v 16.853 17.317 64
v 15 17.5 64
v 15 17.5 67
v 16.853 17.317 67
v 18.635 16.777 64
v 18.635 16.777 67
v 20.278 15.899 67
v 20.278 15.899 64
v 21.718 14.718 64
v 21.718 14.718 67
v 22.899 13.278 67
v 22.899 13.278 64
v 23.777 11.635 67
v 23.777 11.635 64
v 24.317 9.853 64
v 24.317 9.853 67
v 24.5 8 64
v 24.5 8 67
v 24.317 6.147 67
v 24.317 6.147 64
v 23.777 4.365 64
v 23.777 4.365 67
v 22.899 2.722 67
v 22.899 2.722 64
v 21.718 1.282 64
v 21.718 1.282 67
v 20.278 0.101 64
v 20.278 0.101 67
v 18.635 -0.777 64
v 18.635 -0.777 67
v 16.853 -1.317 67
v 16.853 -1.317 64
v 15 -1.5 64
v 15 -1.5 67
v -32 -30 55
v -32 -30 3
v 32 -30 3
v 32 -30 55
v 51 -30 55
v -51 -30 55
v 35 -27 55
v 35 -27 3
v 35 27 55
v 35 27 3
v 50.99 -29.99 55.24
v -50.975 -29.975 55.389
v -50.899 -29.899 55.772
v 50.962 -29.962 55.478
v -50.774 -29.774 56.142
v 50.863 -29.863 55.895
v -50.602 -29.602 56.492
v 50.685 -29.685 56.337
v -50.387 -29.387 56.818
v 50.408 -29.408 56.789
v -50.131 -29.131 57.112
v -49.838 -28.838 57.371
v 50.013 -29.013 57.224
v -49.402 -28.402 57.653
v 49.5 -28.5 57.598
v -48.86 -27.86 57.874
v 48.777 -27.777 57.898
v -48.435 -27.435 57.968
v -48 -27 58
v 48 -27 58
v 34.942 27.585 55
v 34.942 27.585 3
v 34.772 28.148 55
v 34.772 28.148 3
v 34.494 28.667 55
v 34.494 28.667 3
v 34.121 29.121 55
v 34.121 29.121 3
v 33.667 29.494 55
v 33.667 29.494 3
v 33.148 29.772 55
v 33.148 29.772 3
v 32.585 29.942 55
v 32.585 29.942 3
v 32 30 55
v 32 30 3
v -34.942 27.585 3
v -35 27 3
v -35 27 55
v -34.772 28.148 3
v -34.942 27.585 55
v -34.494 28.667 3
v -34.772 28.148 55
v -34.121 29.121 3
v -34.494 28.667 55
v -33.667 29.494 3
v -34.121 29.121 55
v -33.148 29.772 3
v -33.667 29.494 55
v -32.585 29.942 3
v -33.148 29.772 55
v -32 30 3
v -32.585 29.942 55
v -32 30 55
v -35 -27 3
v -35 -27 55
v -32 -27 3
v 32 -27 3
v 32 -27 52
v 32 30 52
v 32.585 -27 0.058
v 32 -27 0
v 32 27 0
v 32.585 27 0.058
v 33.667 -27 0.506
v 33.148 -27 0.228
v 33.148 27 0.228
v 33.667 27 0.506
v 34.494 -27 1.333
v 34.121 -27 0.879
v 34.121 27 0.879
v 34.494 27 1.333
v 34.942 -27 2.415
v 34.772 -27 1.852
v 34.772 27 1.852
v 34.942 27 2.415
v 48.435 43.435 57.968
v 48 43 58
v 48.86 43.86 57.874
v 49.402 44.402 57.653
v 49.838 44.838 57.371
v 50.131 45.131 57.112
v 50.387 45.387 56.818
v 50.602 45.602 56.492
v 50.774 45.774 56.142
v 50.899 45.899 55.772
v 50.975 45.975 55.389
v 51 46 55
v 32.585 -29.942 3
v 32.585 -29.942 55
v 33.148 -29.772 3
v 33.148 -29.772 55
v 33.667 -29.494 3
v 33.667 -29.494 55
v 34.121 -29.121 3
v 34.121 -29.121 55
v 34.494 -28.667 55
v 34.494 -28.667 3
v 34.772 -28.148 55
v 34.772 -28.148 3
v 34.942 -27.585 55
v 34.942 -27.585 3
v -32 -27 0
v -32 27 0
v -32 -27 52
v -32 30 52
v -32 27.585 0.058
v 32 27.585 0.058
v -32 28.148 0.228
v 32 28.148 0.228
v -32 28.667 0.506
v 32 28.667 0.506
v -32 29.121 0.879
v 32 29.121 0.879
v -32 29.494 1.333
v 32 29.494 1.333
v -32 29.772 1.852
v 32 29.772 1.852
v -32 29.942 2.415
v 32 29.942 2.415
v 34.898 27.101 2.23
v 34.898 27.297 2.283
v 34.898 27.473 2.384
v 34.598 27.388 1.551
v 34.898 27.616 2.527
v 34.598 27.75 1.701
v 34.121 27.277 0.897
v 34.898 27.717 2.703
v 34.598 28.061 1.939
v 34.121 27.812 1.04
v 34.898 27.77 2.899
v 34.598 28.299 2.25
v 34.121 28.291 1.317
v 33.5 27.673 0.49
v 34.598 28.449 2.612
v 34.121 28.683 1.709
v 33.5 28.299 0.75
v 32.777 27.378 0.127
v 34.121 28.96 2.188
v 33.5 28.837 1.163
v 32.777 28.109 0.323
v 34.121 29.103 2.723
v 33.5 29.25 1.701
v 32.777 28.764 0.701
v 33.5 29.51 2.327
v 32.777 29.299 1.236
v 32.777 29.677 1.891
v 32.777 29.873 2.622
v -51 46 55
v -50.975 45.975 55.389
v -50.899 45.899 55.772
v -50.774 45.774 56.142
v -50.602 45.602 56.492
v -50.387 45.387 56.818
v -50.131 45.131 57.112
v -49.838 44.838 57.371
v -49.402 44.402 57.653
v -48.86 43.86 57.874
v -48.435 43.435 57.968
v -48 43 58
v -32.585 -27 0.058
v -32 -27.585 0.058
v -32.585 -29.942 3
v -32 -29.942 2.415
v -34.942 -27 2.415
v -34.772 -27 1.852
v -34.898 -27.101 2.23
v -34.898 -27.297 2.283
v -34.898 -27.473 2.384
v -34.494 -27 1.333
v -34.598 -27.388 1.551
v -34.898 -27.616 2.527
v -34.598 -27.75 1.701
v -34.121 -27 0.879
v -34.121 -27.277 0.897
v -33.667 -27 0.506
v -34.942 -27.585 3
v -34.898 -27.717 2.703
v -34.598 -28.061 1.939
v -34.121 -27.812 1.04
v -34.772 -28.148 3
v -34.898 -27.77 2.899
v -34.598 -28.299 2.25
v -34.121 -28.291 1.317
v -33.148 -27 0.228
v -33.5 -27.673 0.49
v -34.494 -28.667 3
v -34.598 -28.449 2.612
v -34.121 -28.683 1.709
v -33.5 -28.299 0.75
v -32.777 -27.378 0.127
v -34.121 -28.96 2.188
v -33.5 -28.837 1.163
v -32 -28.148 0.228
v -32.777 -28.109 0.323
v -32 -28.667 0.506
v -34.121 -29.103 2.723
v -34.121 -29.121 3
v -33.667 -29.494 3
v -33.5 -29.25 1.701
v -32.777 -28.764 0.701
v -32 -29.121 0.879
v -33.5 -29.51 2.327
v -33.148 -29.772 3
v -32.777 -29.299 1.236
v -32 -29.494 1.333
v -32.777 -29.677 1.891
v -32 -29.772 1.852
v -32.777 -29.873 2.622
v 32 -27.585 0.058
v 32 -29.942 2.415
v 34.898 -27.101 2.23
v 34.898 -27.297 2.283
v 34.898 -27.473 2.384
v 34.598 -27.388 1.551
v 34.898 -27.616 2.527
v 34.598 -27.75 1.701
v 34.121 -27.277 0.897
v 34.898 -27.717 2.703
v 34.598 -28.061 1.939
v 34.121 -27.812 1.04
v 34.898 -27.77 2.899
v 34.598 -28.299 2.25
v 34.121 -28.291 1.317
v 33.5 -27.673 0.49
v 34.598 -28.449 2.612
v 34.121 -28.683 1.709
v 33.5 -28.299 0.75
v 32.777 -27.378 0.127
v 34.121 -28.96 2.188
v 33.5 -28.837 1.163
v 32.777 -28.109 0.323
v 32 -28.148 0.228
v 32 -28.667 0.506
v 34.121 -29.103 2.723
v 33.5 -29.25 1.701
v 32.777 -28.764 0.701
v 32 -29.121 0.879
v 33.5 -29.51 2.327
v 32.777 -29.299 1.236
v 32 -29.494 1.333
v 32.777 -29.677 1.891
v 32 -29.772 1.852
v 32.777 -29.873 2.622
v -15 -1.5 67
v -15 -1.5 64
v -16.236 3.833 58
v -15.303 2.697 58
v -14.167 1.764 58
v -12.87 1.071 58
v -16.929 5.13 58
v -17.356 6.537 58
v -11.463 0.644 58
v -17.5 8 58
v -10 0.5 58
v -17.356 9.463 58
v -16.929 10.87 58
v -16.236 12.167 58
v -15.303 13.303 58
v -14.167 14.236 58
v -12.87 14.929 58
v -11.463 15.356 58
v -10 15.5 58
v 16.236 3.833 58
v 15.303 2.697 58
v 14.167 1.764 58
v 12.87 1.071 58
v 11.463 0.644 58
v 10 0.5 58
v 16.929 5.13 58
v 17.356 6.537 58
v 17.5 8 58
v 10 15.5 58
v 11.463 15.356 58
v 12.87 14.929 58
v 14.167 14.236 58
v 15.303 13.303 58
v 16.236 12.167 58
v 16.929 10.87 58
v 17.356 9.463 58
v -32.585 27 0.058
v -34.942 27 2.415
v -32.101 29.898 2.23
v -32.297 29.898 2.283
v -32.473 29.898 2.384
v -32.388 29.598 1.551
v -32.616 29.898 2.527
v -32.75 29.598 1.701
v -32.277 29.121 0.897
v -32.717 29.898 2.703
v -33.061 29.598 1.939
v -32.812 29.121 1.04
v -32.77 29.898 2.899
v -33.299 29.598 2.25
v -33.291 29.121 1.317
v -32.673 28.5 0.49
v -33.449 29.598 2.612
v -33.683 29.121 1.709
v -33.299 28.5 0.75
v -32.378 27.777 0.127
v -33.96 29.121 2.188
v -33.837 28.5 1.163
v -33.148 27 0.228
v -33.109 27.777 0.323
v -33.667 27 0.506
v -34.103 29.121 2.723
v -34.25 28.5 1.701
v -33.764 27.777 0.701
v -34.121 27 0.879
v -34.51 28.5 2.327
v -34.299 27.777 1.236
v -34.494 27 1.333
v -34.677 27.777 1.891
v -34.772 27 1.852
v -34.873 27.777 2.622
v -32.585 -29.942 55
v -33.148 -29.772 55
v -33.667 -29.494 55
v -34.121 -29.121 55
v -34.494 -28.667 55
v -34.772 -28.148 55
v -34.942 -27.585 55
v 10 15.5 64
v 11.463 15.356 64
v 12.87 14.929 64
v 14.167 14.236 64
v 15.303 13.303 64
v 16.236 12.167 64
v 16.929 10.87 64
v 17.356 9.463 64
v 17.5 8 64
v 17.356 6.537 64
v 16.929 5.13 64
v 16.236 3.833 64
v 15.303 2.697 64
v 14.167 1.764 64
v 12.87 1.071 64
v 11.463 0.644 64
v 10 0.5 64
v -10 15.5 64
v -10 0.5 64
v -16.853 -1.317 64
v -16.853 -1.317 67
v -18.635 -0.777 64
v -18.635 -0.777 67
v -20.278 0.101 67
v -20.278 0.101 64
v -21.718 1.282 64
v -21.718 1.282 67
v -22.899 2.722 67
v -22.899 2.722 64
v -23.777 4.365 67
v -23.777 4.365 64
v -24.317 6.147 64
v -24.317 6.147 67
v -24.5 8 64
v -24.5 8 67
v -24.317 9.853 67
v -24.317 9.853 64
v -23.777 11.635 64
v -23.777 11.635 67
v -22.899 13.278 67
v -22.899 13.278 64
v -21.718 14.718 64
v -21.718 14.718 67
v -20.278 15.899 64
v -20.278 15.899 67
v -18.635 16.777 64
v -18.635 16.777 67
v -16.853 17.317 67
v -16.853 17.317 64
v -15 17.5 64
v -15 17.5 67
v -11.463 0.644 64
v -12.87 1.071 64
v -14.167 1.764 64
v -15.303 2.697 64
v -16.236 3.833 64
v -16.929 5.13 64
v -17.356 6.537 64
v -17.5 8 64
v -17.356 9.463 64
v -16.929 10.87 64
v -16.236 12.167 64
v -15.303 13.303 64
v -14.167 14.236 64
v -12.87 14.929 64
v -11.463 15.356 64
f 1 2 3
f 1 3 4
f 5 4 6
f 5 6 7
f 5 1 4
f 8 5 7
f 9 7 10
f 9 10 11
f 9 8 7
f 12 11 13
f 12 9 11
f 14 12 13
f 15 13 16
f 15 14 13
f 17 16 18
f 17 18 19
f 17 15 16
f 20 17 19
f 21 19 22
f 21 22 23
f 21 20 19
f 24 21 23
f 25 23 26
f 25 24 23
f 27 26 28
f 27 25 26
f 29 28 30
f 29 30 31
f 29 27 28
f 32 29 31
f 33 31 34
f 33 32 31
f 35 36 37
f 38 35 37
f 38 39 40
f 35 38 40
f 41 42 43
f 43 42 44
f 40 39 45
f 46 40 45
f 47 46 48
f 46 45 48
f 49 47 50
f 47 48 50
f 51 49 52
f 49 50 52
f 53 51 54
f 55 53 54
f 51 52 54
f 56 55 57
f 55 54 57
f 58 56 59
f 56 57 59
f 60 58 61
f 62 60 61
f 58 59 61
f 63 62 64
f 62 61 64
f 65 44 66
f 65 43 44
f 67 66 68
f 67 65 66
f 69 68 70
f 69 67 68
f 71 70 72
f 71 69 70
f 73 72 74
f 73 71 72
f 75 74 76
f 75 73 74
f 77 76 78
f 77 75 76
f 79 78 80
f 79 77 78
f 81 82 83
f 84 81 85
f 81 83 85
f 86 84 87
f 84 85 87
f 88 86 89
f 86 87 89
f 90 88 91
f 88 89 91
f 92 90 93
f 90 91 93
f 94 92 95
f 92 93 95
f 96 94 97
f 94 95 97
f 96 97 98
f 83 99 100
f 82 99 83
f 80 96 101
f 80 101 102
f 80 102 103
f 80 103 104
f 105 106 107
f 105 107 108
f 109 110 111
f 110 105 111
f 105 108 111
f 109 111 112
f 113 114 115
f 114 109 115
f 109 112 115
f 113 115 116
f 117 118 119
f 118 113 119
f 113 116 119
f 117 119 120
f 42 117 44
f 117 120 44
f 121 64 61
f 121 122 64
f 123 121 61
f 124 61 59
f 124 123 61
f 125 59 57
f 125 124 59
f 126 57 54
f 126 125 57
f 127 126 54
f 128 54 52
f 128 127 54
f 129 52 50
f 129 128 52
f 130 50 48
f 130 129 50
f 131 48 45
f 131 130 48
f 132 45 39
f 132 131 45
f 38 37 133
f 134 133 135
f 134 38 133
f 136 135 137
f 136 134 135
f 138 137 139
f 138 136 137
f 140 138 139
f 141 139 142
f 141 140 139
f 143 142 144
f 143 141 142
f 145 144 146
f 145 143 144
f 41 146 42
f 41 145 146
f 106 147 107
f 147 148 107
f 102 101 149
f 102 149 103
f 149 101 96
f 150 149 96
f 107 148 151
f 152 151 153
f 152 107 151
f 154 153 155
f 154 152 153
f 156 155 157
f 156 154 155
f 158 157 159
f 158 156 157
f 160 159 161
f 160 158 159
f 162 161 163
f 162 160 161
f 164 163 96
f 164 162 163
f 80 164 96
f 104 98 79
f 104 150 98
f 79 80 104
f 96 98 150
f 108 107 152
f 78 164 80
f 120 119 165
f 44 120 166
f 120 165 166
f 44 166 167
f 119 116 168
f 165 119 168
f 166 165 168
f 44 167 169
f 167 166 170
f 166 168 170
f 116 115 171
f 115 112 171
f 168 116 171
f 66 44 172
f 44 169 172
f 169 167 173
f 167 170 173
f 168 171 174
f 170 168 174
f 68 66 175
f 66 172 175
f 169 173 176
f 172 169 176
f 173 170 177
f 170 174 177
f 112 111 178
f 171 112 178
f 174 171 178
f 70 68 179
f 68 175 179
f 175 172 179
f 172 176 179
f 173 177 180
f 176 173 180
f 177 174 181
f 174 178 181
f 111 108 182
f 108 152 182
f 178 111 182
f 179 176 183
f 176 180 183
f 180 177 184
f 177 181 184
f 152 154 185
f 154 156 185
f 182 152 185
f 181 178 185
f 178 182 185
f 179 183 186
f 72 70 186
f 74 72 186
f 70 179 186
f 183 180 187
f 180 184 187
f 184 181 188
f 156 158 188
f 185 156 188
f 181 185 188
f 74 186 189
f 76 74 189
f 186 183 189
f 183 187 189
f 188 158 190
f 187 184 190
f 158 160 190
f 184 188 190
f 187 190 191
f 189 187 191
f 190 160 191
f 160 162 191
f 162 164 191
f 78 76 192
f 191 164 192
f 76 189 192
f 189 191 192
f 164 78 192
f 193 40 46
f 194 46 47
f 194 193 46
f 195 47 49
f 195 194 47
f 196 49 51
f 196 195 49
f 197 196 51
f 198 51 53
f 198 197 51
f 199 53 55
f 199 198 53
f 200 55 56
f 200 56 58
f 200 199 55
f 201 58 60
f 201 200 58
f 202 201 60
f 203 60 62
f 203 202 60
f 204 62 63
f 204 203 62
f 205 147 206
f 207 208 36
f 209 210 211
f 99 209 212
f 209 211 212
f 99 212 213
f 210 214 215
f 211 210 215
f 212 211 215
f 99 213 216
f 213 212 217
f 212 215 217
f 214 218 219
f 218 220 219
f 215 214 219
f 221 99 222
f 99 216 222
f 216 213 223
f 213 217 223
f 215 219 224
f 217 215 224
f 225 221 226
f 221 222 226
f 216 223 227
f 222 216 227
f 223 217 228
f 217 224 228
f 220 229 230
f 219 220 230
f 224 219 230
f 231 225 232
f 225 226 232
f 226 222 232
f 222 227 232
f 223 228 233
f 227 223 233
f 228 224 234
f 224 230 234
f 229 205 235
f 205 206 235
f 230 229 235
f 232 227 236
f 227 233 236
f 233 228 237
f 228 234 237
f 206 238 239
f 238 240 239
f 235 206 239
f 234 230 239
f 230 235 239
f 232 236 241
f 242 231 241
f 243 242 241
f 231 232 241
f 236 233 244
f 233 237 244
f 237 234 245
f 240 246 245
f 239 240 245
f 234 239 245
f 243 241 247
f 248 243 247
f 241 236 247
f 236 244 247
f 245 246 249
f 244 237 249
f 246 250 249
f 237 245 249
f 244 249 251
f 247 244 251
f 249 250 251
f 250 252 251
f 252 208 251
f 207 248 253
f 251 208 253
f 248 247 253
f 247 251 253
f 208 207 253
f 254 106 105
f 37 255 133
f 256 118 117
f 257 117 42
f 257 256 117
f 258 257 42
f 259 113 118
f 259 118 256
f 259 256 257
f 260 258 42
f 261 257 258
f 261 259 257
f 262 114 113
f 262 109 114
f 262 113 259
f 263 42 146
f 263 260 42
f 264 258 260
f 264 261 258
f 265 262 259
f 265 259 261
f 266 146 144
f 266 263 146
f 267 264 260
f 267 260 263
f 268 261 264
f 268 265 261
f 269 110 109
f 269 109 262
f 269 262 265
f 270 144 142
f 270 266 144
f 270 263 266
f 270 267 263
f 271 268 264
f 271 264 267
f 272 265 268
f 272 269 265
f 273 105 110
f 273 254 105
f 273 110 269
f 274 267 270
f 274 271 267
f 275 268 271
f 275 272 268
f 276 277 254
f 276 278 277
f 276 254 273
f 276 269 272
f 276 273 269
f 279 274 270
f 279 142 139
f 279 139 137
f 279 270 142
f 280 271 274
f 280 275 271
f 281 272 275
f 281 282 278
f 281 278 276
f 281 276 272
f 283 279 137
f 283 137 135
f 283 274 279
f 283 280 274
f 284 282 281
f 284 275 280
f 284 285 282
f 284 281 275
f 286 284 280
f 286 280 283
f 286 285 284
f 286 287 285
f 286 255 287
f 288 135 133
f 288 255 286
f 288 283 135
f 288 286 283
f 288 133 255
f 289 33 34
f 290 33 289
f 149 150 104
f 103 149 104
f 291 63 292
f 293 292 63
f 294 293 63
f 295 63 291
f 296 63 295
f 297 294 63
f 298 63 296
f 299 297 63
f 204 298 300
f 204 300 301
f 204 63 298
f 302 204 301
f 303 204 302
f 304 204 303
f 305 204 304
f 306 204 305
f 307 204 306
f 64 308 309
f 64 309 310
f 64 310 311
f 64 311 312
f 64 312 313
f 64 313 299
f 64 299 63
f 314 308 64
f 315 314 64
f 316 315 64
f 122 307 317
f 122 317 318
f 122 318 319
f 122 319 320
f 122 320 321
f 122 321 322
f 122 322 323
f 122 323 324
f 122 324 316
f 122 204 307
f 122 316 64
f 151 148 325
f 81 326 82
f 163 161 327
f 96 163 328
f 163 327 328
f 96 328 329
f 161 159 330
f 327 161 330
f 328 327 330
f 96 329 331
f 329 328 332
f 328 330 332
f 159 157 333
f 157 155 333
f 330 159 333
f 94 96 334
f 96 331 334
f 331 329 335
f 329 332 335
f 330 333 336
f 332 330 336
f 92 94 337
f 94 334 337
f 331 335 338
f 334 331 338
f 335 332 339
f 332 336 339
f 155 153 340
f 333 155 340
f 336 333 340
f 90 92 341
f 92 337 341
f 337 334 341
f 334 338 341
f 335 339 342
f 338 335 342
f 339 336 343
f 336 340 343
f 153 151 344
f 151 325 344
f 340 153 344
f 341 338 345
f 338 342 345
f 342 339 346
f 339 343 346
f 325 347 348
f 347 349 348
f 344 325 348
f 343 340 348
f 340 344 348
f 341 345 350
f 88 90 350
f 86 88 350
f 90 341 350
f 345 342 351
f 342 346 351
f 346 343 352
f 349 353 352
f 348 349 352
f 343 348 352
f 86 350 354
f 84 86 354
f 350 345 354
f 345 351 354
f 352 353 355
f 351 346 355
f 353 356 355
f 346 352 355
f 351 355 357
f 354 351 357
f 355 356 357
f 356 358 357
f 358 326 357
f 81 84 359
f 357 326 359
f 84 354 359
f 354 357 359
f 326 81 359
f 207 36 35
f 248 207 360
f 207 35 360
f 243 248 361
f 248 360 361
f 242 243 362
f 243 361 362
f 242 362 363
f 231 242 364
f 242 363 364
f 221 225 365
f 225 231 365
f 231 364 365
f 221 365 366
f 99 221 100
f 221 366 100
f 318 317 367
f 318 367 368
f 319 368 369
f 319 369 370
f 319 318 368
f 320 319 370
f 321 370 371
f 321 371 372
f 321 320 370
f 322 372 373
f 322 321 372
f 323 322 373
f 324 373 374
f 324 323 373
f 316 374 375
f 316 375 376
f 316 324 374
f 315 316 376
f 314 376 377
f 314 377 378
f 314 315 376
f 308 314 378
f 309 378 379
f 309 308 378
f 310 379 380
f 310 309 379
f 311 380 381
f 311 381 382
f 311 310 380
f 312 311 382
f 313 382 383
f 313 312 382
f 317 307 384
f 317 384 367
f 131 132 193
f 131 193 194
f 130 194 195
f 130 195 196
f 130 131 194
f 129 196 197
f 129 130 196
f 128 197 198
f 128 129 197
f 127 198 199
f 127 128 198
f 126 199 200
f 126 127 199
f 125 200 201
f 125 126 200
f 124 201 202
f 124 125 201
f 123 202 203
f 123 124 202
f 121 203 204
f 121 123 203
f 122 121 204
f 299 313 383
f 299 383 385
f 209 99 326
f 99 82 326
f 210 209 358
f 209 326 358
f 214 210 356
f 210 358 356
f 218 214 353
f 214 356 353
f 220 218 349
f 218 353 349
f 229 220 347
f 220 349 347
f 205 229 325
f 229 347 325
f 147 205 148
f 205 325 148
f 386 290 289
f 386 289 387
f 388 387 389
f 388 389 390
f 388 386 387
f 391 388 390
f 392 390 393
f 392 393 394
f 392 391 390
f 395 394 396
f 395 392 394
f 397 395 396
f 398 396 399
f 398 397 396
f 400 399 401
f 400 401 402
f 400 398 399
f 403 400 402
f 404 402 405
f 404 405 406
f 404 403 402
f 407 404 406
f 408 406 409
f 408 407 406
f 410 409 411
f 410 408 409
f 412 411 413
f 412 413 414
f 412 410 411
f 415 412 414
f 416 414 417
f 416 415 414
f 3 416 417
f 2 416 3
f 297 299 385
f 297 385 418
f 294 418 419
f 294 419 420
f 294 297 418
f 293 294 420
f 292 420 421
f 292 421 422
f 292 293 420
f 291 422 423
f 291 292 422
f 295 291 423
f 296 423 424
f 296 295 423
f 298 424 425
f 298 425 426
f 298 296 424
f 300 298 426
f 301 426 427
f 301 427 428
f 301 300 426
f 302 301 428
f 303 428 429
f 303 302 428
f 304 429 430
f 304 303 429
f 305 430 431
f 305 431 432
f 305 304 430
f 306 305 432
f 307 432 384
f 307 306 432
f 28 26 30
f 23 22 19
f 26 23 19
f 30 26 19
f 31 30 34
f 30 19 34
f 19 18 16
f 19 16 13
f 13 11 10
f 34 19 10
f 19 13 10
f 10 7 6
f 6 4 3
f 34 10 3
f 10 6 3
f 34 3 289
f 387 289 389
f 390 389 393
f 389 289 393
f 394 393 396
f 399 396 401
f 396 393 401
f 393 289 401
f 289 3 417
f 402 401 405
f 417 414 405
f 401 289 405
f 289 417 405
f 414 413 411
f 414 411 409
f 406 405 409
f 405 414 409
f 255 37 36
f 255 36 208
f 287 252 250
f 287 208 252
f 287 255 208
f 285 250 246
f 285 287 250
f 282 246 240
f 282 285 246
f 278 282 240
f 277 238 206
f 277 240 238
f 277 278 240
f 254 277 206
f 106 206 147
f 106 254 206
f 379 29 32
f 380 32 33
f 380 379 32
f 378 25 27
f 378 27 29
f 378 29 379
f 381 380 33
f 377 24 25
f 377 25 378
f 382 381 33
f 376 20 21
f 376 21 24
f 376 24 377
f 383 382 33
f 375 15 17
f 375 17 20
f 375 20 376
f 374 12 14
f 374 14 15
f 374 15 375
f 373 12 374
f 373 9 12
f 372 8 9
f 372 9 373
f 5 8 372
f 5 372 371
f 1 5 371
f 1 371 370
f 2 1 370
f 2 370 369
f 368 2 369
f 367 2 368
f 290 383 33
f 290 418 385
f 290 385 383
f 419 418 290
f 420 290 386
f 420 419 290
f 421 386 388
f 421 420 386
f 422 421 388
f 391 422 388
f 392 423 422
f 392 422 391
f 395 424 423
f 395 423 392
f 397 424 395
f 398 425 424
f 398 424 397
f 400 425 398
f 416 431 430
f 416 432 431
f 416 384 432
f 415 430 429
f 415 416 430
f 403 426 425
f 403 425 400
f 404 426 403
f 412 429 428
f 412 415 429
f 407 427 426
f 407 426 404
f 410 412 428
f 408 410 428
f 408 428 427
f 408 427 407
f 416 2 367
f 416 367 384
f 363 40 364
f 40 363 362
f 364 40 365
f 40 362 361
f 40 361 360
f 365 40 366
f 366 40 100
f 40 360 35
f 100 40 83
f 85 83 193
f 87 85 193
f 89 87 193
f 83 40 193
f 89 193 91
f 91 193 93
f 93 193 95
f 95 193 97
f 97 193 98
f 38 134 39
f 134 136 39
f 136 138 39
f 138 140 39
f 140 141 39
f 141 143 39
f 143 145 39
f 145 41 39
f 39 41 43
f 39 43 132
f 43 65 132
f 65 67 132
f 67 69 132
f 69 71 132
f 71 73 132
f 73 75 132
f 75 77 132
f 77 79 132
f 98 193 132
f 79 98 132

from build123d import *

# Parameters (mm, degrees)
SKETCH_1_W      = 70
SKETCH_1_H      = 60
EXTRUDE_1_DEPTH = 55
SHELL_1_T       = -3
SKETCH_2_W      = 102
SKETCH_2_H      = 76
EXTRUDE_2_DEPTH = 3
FILLET_1_R      = 3
FILLET_4_R      = 3
EXTRUDE_3_DEPTH = 6
EXTRUDE_4_DEPTH = 3


with BuildPart() as part:
    # 草图1 → 凸台-拉伸1 (new body)
    with BuildSketch(Plane.XY):
        Rectangle(SKETCH_1_W, SKETCH_1_H)
    extrude(amount=EXTRUDE_1_DEPTH)

    # 抽壳1
    shell_1_openings = [part.faces().sort_by_distance(p)[0] for p in [
        (0, 30, 27.5),
    ]]
    offset(amount=SHELL_1_T, openings=shell_1_openings, kind=Kind.INTERSECTION)

    # 草图2 → 凸台-拉伸2 (add)
    with BuildSketch(Plane.XY.offset(55)):
        with Locations((0, 8)):
            Rectangle(SKETCH_2_W, SKETCH_2_H)
    extrude(amount=EXTRUDE_2_DEPTH)

    # 圆角1
    fillet_1_edges = [part.edges().sort_by_distance(p)[0] for p in [
        (0, 46, 58),
        (51, 8, 58),
        (0, -30, 58),
        (-51, 8, 58),
    ]]
    fillet(fillet_1_edges, radius=FILLET_1_R - 0.0001)  # a hair under: the kernel refuses the full size

    # 圆角4
    fillet_4_edges = [part.edges().sort_by_distance(p)[0] for p in [
        (0, -30, 0),
        (-35, 0, 0),
        (0, 30, 0),
        (35, 0, 0),
        (35, -30, 27.5),
        (-35, -30, 27.5),
        (-35, 30, 27.5),
        (35, 30, 27.5),
    ]]
    fillet(fillet_4_edges, radius=FILLET_4_R - 0.0001)  # a hair under: the kernel refuses the full size

    # 草图3 → 凸台-拉伸3 (add)
    with BuildSketch(Plane.XY.offset(58)):
        with BuildLine():
            Line((-10, 15.5), (10, 15.5))
            ThreePointArc((10, 15.5), (17.5, 8), (10, 0.5))
            Line((10, 0.5), (-10, 0.5))
            ThreePointArc((-10, 0.5), (-17.5, 8), (-10, 15.5))
        make_face()
    extrude(amount=EXTRUDE_3_DEPTH)

    # 草图4 → 凸台-拉伸4 (add)
    with BuildSketch(Plane.XY.offset(64)):
        with BuildLine():
            Line((-15, 17.5), (15, 17.5))
            ThreePointArc((15, 17.5), (24.5, 8), (15, -1.5))
            Line((15, -1.5), (-15, -1.5))
            ThreePointArc((-15, -1.5), (-24.5, 8), (-15, 17.5))
        make_face()
    extrude(amount=EXTRUDE_4_DEPTH)


solid = part.part
